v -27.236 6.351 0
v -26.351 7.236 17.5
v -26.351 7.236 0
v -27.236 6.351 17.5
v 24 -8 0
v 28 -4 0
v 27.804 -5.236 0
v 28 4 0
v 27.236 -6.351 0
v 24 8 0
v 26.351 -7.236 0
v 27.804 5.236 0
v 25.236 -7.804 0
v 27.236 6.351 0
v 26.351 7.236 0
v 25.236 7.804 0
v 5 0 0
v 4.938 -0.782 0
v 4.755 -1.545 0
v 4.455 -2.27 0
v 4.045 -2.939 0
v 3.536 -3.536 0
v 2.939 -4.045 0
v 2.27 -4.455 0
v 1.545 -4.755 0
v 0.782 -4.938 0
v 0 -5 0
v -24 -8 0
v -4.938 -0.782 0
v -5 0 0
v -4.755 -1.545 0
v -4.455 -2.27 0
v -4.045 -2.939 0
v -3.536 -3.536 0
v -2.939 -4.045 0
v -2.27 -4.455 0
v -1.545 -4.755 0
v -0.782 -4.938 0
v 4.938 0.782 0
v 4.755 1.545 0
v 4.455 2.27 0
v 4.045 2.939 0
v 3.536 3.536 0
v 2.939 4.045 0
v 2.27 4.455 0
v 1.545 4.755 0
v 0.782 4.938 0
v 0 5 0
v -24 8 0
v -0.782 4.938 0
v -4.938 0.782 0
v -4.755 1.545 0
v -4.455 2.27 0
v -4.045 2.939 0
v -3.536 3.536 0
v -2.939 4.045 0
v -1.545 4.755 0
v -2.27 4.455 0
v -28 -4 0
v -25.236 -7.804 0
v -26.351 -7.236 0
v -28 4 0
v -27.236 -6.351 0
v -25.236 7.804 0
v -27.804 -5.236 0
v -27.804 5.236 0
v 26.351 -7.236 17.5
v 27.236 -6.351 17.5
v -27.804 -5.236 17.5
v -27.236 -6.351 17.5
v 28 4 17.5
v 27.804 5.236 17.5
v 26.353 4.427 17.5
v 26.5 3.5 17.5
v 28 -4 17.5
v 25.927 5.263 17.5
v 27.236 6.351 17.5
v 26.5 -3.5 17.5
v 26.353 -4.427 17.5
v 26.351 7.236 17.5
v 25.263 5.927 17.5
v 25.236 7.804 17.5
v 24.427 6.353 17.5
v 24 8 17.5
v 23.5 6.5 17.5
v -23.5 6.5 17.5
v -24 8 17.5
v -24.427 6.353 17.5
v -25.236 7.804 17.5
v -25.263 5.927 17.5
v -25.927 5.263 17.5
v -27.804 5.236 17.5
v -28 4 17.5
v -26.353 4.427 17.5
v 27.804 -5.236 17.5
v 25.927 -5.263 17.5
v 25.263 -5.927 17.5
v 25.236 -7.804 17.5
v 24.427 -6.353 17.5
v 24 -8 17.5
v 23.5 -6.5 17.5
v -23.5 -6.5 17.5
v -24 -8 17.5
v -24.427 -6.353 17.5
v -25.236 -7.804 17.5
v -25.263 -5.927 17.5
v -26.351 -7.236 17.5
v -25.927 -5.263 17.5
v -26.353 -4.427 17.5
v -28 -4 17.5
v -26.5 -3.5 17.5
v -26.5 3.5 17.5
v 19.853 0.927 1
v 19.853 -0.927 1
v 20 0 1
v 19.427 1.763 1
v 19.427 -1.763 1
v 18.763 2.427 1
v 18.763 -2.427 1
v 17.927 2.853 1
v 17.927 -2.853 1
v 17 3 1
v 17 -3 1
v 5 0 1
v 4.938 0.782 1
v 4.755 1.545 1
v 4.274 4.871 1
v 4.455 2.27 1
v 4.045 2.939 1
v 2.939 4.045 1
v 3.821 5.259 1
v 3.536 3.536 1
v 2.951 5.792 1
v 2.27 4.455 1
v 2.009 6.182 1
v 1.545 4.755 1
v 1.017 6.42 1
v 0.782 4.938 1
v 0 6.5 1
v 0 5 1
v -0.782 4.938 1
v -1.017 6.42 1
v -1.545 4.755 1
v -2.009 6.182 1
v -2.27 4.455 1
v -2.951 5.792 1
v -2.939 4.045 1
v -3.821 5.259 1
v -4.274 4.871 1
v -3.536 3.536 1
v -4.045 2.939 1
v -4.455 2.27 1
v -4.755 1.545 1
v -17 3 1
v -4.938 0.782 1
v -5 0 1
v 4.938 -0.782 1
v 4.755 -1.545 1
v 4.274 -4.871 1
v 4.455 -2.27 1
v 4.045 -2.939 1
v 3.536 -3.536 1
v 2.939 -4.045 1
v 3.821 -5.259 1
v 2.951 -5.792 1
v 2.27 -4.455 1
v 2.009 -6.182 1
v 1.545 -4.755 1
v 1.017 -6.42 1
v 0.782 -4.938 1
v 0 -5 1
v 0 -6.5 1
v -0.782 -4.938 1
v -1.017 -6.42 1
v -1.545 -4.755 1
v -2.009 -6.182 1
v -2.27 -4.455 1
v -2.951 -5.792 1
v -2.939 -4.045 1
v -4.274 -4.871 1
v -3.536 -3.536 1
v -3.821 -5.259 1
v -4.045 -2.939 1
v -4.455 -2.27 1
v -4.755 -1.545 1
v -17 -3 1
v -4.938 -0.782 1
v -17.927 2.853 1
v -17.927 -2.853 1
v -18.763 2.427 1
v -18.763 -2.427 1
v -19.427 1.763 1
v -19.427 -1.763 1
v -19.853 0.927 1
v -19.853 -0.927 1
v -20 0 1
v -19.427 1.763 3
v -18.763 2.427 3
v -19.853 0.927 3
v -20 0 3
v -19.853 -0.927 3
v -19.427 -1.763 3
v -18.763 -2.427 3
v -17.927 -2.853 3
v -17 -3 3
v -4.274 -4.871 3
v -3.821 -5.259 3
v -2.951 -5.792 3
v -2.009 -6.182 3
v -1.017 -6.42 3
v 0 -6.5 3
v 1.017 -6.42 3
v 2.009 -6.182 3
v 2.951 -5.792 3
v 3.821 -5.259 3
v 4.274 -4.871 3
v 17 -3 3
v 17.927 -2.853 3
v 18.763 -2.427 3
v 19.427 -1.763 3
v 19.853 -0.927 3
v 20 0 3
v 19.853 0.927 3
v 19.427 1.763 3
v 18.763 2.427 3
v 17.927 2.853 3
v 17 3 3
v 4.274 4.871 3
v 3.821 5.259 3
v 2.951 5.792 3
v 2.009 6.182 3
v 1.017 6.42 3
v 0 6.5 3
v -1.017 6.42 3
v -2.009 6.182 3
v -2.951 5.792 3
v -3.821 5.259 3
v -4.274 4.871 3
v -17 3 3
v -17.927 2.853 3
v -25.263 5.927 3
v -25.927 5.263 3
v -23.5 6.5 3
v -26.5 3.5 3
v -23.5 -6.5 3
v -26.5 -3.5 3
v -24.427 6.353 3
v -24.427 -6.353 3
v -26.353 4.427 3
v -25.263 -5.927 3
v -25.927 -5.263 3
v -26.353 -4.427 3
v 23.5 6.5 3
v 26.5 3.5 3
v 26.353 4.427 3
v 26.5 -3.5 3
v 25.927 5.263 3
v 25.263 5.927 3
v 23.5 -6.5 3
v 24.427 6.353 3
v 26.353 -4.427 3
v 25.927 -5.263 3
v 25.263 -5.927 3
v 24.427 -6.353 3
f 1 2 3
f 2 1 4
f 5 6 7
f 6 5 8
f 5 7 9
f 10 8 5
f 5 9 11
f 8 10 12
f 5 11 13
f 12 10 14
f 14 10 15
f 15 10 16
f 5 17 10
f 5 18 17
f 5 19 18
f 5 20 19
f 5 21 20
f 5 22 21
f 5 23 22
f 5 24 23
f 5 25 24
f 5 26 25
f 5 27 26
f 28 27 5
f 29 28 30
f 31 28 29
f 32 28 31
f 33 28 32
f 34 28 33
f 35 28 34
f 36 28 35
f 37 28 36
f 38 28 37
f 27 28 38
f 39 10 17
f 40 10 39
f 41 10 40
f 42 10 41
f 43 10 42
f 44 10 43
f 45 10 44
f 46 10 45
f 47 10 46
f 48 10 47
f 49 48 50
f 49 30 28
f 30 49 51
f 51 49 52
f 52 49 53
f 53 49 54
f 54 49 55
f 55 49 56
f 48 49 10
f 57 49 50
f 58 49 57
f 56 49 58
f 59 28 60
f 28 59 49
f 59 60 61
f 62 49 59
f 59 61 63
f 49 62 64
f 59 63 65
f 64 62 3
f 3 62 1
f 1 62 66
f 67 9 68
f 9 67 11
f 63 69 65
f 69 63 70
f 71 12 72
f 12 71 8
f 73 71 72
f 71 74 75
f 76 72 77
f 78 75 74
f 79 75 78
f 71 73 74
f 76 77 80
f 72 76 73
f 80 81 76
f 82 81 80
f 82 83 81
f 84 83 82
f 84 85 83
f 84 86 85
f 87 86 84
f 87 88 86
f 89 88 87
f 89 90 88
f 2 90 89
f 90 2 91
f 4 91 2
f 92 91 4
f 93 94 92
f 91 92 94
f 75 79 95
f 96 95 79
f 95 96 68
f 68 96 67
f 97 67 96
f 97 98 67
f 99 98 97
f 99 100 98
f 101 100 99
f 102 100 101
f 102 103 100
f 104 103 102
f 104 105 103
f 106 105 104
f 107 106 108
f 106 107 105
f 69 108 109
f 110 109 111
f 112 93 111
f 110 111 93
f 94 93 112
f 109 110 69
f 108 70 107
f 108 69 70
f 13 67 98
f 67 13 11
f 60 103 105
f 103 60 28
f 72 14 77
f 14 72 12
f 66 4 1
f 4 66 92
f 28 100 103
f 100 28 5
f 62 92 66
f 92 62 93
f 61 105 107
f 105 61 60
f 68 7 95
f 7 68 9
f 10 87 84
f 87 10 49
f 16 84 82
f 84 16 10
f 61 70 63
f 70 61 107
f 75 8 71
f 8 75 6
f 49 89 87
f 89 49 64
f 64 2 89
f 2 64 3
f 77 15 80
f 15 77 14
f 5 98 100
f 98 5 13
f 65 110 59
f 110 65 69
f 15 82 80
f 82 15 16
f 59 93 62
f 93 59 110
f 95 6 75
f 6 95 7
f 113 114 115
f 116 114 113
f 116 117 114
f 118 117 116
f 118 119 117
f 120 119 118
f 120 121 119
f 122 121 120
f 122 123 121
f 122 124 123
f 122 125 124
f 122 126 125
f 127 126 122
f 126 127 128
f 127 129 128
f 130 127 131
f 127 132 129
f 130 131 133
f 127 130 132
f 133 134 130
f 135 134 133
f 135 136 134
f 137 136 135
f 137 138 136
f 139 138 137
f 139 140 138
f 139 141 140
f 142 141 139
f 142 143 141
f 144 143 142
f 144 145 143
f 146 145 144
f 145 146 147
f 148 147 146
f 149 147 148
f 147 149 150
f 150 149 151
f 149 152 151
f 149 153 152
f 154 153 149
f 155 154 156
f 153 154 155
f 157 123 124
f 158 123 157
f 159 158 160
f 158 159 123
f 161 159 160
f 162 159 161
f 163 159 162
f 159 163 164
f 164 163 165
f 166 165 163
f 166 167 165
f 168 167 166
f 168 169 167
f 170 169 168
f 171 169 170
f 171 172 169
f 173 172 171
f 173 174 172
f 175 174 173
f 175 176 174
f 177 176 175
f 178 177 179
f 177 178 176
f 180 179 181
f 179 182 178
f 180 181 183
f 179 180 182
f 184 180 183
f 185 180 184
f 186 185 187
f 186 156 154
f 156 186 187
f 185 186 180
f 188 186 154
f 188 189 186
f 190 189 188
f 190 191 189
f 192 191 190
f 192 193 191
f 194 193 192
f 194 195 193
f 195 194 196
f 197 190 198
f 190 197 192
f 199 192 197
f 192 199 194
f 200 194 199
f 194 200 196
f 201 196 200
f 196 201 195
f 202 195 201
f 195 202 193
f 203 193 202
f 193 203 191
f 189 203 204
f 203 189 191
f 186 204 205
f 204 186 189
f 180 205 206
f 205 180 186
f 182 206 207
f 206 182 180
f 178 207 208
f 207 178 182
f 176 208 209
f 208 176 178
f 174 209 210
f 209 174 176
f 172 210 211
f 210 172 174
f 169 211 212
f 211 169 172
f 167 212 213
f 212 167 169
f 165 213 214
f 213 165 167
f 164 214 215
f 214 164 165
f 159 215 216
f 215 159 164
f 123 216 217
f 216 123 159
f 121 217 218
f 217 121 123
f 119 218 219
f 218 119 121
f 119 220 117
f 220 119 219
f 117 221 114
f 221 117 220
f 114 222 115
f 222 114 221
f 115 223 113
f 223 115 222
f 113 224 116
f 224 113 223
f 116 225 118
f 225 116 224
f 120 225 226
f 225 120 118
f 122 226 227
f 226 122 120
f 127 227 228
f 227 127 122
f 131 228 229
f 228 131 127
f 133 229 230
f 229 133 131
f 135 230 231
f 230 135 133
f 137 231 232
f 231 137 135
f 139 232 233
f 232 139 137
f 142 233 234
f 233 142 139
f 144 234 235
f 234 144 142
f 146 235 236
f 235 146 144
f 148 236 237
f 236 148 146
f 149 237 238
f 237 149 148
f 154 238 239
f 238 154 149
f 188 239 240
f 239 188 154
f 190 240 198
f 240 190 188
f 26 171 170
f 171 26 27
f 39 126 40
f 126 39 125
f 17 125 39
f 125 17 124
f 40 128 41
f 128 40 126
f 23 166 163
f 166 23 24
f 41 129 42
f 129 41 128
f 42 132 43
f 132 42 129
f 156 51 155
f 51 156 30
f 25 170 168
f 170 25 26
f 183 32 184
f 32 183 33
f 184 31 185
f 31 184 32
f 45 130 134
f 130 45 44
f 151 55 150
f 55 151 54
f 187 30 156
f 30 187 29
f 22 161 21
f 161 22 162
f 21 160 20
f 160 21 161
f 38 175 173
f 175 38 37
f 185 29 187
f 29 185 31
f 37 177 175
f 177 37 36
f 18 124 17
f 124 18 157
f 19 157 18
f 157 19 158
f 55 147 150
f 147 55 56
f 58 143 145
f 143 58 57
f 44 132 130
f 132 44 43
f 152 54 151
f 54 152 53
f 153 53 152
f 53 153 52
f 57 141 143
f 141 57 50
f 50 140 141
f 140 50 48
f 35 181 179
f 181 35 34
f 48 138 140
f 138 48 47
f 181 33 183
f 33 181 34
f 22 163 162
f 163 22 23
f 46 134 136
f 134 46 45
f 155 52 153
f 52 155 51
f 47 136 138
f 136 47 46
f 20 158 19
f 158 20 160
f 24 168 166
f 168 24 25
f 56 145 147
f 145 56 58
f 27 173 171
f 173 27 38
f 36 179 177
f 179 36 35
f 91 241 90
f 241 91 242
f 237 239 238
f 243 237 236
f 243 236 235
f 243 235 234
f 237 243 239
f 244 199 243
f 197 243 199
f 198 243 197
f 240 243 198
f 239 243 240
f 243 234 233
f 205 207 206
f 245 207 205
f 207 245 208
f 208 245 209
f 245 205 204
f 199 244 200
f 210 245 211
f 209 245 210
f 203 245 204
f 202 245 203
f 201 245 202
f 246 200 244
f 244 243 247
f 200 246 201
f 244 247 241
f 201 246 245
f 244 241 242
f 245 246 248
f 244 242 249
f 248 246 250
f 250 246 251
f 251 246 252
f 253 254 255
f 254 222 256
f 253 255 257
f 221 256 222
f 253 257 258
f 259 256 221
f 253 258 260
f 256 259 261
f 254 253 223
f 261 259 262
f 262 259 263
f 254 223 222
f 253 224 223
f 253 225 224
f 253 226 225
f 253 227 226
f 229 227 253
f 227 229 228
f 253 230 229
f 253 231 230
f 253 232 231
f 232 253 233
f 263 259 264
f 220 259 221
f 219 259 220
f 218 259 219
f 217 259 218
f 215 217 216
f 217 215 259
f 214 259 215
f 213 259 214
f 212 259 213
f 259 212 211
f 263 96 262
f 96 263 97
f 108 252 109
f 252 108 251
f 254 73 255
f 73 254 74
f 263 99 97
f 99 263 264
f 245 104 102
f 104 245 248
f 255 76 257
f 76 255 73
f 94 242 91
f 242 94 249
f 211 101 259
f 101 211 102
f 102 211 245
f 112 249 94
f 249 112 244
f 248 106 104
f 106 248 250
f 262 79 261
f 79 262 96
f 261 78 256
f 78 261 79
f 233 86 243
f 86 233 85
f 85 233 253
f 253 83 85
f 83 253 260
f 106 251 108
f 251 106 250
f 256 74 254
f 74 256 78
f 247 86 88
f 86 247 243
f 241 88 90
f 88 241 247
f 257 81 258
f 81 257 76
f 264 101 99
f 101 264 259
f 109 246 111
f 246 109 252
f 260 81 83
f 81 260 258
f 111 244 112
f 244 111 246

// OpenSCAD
difference(){
  linear_extrude(17.5) {
    rrect(56,16,4);
  }
translate([0,0,1]) linear_extrude(2.01) {
circle(d=13,$fn=40);
translate([17,0]) circle(d=6,$fn=20);
translate([-17,0]) circle(d=6,$fn=20);
polygon([[-17,-3],[0,-5.5],[17,-3],[17,3],[0,5.5],[-17,3]]);
}
  translate([0,0,-.01]) cylinder(d=10,h=3,$fn=40);
  translate([0,0,3]) linear_extrude(20) rrect(53,13,3);
}

module rrect(w,h,r)
{
  for(x=[w/-2+r,w/2-r],y=[h/-2+r,h/2-r])
    translate([x,y]) circle(r=r,$fn=20);
  polygon([[w/-2,h/2-r],[w/-2,h/-2+r],[w/-2+r,h/-2],[w/2-r,h/-2],[w/2,h/-2+r],[w/2,h/2-r],[w/2-r,h/2],[w/-2+r,h/2]]);
}
